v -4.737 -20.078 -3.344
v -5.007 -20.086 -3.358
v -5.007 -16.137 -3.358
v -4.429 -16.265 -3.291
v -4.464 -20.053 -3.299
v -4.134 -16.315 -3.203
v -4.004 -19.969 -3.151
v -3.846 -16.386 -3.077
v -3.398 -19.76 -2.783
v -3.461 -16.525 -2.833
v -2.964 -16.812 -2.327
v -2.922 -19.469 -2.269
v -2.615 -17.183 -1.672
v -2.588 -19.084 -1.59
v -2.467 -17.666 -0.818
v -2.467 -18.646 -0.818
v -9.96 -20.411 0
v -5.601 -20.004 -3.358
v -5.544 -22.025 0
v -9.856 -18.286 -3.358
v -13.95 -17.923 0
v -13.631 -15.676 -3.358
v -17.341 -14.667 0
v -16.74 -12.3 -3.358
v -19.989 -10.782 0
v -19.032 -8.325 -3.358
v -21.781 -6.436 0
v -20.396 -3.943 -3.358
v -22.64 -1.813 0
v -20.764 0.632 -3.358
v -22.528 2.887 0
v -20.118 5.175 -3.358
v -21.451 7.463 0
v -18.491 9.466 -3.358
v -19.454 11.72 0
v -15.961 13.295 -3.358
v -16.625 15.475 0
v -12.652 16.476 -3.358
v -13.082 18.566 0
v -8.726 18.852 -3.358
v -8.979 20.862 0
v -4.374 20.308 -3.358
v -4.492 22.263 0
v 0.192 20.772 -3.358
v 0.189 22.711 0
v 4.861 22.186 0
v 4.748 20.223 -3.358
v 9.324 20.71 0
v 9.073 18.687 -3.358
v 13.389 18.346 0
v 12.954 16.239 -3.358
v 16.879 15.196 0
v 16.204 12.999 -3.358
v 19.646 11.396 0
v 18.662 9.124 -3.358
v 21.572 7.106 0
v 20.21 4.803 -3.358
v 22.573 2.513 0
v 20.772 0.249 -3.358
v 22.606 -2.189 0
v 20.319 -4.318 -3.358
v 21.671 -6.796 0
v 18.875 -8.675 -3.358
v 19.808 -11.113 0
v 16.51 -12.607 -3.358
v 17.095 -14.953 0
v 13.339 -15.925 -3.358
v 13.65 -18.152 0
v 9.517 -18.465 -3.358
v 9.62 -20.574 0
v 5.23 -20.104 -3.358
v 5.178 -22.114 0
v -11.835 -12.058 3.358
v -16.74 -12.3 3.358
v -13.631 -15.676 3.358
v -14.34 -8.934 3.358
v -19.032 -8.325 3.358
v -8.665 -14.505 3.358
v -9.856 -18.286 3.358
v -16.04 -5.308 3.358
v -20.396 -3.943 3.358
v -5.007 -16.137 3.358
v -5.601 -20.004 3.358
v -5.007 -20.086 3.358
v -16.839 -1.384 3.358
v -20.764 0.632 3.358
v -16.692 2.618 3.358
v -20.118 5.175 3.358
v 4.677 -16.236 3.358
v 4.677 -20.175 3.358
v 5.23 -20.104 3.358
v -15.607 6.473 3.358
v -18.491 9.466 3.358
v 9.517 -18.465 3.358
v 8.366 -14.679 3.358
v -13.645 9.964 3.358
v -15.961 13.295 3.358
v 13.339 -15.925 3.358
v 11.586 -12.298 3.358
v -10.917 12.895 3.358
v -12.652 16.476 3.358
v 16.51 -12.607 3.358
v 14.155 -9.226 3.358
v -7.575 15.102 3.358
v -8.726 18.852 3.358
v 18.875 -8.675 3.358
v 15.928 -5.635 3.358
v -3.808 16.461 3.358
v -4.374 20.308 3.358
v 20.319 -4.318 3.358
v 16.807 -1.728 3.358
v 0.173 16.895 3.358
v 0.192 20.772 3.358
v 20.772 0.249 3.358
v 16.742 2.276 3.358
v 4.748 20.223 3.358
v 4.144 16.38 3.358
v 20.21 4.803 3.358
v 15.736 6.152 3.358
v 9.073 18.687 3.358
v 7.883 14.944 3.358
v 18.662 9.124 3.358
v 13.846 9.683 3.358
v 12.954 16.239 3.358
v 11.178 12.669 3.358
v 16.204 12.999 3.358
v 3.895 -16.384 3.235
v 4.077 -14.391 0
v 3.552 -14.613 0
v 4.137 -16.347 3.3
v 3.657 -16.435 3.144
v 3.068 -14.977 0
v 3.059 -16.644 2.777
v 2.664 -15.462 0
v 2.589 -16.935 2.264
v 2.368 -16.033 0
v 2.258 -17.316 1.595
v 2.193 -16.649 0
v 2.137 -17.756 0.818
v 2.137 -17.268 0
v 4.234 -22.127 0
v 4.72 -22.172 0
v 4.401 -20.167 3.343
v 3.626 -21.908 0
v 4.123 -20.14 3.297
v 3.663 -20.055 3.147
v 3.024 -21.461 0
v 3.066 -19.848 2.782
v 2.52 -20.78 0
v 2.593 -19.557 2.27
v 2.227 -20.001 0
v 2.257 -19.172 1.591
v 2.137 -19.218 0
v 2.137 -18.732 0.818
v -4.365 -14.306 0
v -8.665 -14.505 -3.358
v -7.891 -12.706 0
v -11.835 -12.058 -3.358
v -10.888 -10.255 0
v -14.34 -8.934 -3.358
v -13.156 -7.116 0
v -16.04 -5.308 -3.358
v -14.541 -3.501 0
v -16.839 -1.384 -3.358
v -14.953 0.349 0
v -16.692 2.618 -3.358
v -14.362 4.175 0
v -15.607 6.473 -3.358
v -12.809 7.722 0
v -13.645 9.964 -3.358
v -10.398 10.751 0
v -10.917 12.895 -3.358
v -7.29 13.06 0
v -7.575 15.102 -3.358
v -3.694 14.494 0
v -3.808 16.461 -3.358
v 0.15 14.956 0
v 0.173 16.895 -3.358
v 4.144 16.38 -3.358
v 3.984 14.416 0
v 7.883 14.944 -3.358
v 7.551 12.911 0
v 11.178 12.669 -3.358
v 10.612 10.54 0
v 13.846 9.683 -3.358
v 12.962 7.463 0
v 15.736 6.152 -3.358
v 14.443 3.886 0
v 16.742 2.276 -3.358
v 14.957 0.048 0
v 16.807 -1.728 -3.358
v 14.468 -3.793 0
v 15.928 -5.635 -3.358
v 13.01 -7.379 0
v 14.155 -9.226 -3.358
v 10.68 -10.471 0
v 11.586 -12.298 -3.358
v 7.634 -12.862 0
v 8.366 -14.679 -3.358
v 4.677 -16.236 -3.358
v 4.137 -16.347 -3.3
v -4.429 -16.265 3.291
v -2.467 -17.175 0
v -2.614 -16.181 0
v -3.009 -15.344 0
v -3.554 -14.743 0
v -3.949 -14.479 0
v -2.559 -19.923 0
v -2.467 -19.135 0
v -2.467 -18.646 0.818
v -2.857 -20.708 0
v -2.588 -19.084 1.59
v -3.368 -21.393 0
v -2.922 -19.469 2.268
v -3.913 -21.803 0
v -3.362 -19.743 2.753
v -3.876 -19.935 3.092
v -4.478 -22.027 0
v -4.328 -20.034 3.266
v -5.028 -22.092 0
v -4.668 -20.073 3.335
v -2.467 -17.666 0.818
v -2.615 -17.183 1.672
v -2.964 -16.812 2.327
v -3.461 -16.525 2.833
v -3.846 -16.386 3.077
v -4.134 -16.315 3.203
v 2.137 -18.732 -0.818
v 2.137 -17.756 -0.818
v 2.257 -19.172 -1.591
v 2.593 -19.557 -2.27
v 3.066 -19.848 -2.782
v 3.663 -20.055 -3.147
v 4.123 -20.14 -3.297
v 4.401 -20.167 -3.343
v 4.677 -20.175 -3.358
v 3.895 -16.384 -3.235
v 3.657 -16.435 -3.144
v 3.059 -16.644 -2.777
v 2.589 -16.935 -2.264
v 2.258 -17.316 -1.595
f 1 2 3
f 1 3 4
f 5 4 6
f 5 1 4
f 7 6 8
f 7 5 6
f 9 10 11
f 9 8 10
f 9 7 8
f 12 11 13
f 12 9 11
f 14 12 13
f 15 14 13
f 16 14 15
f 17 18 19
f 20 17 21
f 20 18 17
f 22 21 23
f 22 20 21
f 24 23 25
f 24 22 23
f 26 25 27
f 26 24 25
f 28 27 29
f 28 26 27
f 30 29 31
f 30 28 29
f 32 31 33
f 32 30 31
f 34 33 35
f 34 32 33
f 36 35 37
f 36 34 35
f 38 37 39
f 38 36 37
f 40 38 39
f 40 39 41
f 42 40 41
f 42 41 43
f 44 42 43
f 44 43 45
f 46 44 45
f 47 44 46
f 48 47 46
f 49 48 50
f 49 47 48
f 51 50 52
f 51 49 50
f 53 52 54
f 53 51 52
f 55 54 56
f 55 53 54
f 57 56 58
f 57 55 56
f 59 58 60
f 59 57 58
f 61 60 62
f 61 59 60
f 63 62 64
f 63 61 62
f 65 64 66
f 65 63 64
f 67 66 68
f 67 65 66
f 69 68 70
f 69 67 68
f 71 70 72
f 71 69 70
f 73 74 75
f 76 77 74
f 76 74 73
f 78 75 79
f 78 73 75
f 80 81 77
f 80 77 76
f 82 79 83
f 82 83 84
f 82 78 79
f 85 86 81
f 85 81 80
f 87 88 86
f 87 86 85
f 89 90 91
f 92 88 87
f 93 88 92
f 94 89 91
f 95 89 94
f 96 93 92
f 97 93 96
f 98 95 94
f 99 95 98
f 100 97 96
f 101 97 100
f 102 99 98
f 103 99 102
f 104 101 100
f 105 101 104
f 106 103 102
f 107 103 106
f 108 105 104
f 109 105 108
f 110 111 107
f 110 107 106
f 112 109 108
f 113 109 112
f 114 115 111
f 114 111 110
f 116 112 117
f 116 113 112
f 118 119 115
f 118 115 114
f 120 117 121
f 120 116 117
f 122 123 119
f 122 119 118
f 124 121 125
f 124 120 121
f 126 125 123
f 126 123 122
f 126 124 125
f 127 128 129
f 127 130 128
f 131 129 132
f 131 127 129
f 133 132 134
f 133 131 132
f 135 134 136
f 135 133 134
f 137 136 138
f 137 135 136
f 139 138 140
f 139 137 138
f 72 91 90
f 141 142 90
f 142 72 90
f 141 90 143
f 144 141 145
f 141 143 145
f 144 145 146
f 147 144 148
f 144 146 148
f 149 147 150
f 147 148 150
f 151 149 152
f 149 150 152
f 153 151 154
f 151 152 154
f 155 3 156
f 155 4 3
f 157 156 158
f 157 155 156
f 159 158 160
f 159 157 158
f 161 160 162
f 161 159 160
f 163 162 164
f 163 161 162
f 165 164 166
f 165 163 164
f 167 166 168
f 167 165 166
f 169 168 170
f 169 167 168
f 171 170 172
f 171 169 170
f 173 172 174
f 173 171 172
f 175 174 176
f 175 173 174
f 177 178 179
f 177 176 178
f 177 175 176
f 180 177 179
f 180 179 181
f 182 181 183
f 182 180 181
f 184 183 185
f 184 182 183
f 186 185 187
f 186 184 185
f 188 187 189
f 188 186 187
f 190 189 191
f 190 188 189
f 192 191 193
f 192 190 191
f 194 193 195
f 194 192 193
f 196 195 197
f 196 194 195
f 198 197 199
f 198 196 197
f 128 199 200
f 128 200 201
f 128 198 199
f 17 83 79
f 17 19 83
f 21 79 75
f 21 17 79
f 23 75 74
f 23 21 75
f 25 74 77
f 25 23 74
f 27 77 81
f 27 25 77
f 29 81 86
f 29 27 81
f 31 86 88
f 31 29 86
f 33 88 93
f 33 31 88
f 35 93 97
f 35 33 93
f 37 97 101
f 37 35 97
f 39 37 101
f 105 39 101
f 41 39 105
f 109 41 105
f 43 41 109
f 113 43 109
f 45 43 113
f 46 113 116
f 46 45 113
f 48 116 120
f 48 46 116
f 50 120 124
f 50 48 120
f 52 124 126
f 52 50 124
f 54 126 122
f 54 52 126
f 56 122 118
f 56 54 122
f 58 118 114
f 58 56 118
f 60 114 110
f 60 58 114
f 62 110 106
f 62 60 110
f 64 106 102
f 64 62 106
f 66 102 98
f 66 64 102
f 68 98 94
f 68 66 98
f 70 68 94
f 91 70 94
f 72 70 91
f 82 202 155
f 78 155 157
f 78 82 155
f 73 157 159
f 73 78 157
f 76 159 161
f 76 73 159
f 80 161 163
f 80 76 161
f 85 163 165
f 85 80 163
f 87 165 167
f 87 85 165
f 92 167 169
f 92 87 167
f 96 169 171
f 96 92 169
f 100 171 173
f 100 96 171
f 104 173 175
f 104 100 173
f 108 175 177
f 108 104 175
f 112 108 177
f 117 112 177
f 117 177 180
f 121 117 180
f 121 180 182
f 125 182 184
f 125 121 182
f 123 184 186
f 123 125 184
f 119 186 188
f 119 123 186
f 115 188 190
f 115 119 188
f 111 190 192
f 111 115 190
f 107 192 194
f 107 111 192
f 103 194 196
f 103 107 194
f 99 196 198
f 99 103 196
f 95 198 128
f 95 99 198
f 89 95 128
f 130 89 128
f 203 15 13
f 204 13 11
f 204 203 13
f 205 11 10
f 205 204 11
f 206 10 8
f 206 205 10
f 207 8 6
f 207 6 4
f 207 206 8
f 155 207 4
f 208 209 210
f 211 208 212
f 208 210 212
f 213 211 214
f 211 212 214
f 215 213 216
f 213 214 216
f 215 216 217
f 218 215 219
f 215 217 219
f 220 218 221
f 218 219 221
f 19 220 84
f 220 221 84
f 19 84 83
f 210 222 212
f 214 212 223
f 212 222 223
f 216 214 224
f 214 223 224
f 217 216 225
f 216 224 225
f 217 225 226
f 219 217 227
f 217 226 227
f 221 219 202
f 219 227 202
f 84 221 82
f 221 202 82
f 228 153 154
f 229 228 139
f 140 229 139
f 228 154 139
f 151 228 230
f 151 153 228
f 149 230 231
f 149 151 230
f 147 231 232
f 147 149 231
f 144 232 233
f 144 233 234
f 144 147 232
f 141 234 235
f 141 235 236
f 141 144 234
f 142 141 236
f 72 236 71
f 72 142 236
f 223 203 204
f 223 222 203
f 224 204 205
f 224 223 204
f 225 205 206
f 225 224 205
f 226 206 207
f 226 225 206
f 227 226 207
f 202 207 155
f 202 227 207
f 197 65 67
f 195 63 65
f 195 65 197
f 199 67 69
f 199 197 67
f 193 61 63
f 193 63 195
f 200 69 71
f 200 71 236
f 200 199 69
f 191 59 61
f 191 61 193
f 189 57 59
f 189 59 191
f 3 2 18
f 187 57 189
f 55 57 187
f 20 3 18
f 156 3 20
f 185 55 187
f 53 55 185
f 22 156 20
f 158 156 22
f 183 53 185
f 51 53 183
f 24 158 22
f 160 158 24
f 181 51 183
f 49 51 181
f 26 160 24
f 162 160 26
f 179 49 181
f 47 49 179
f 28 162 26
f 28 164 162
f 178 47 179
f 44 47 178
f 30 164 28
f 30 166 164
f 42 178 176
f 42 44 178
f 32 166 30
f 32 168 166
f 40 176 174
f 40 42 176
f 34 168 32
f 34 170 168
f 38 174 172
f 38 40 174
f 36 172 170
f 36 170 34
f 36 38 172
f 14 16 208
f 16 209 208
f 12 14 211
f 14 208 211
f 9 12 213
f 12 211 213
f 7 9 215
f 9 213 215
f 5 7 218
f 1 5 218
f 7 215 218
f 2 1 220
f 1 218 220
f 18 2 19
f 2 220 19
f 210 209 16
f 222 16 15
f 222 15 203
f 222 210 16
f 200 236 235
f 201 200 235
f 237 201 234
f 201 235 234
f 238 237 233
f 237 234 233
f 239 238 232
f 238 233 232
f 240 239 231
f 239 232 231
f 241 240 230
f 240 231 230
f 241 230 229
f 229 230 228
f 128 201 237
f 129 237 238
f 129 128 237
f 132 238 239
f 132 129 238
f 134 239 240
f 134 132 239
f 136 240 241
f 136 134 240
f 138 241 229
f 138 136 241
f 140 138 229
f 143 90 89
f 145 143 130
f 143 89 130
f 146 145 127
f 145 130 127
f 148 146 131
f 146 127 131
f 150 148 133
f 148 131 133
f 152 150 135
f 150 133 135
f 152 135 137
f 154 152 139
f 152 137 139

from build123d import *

# Parameters (mm, degrees)
F2_W     = 4.604009
F2_H     = 13.256372
F3_DEPTH = 12.7
F4_R     = 2.54


with BuildPart() as f1:
    # F0 (on Front) → F1 (revolve)
    with BuildSketch(Plane.XZ):
        Polygon((-20.773262, -3.358084), (-16.895681, -3.358084), (-14.95689, 0), (-16.895681, 3.358084), (-20.773262, 3.358084), (-22.712053, 0), align=None)
    revolve(axis=Axis((0, 0, 8.760218), (0, 0, -1)))

    # F2 (on Top) → F3 (cut, symmetric)
    with BuildSketch(Plane.XY):
        with Locations((-0.165461, -17.94427)):
            Rectangle(F2_W, F2_H)
    extrude(amount=F3_DEPTH, both=True, mode=Mode.SUBTRACT)

    # F4
    f4_edges = [f1.edges().sort_by_distance(p)[0] for p in [
        (2.136543, -18.711573, -3.358084),
        (2.136543, -21.637376, -1.679134),
        (2.136543, -21.637376, 1.679134),
        (2.136543, -18.711573, 3.358084),
        (2.136543, -15.782185, 1.678804),
        (2.136543, -15.782185, -1.678804),
        (-2.467466, -18.670366, -3.358084),
        (-2.467466, -15.733794, -1.678721),
        (-2.467466, -15.733794, 1.678721),
        (-2.467466, -18.670366, 3.358084),
        (-2.467466, -21.602122, 1.679166),
        (-2.467466, -21.602122, -1.679166),
    ]]
    fillet(f4_edges, radius=F4_R)


solid = f1.part
